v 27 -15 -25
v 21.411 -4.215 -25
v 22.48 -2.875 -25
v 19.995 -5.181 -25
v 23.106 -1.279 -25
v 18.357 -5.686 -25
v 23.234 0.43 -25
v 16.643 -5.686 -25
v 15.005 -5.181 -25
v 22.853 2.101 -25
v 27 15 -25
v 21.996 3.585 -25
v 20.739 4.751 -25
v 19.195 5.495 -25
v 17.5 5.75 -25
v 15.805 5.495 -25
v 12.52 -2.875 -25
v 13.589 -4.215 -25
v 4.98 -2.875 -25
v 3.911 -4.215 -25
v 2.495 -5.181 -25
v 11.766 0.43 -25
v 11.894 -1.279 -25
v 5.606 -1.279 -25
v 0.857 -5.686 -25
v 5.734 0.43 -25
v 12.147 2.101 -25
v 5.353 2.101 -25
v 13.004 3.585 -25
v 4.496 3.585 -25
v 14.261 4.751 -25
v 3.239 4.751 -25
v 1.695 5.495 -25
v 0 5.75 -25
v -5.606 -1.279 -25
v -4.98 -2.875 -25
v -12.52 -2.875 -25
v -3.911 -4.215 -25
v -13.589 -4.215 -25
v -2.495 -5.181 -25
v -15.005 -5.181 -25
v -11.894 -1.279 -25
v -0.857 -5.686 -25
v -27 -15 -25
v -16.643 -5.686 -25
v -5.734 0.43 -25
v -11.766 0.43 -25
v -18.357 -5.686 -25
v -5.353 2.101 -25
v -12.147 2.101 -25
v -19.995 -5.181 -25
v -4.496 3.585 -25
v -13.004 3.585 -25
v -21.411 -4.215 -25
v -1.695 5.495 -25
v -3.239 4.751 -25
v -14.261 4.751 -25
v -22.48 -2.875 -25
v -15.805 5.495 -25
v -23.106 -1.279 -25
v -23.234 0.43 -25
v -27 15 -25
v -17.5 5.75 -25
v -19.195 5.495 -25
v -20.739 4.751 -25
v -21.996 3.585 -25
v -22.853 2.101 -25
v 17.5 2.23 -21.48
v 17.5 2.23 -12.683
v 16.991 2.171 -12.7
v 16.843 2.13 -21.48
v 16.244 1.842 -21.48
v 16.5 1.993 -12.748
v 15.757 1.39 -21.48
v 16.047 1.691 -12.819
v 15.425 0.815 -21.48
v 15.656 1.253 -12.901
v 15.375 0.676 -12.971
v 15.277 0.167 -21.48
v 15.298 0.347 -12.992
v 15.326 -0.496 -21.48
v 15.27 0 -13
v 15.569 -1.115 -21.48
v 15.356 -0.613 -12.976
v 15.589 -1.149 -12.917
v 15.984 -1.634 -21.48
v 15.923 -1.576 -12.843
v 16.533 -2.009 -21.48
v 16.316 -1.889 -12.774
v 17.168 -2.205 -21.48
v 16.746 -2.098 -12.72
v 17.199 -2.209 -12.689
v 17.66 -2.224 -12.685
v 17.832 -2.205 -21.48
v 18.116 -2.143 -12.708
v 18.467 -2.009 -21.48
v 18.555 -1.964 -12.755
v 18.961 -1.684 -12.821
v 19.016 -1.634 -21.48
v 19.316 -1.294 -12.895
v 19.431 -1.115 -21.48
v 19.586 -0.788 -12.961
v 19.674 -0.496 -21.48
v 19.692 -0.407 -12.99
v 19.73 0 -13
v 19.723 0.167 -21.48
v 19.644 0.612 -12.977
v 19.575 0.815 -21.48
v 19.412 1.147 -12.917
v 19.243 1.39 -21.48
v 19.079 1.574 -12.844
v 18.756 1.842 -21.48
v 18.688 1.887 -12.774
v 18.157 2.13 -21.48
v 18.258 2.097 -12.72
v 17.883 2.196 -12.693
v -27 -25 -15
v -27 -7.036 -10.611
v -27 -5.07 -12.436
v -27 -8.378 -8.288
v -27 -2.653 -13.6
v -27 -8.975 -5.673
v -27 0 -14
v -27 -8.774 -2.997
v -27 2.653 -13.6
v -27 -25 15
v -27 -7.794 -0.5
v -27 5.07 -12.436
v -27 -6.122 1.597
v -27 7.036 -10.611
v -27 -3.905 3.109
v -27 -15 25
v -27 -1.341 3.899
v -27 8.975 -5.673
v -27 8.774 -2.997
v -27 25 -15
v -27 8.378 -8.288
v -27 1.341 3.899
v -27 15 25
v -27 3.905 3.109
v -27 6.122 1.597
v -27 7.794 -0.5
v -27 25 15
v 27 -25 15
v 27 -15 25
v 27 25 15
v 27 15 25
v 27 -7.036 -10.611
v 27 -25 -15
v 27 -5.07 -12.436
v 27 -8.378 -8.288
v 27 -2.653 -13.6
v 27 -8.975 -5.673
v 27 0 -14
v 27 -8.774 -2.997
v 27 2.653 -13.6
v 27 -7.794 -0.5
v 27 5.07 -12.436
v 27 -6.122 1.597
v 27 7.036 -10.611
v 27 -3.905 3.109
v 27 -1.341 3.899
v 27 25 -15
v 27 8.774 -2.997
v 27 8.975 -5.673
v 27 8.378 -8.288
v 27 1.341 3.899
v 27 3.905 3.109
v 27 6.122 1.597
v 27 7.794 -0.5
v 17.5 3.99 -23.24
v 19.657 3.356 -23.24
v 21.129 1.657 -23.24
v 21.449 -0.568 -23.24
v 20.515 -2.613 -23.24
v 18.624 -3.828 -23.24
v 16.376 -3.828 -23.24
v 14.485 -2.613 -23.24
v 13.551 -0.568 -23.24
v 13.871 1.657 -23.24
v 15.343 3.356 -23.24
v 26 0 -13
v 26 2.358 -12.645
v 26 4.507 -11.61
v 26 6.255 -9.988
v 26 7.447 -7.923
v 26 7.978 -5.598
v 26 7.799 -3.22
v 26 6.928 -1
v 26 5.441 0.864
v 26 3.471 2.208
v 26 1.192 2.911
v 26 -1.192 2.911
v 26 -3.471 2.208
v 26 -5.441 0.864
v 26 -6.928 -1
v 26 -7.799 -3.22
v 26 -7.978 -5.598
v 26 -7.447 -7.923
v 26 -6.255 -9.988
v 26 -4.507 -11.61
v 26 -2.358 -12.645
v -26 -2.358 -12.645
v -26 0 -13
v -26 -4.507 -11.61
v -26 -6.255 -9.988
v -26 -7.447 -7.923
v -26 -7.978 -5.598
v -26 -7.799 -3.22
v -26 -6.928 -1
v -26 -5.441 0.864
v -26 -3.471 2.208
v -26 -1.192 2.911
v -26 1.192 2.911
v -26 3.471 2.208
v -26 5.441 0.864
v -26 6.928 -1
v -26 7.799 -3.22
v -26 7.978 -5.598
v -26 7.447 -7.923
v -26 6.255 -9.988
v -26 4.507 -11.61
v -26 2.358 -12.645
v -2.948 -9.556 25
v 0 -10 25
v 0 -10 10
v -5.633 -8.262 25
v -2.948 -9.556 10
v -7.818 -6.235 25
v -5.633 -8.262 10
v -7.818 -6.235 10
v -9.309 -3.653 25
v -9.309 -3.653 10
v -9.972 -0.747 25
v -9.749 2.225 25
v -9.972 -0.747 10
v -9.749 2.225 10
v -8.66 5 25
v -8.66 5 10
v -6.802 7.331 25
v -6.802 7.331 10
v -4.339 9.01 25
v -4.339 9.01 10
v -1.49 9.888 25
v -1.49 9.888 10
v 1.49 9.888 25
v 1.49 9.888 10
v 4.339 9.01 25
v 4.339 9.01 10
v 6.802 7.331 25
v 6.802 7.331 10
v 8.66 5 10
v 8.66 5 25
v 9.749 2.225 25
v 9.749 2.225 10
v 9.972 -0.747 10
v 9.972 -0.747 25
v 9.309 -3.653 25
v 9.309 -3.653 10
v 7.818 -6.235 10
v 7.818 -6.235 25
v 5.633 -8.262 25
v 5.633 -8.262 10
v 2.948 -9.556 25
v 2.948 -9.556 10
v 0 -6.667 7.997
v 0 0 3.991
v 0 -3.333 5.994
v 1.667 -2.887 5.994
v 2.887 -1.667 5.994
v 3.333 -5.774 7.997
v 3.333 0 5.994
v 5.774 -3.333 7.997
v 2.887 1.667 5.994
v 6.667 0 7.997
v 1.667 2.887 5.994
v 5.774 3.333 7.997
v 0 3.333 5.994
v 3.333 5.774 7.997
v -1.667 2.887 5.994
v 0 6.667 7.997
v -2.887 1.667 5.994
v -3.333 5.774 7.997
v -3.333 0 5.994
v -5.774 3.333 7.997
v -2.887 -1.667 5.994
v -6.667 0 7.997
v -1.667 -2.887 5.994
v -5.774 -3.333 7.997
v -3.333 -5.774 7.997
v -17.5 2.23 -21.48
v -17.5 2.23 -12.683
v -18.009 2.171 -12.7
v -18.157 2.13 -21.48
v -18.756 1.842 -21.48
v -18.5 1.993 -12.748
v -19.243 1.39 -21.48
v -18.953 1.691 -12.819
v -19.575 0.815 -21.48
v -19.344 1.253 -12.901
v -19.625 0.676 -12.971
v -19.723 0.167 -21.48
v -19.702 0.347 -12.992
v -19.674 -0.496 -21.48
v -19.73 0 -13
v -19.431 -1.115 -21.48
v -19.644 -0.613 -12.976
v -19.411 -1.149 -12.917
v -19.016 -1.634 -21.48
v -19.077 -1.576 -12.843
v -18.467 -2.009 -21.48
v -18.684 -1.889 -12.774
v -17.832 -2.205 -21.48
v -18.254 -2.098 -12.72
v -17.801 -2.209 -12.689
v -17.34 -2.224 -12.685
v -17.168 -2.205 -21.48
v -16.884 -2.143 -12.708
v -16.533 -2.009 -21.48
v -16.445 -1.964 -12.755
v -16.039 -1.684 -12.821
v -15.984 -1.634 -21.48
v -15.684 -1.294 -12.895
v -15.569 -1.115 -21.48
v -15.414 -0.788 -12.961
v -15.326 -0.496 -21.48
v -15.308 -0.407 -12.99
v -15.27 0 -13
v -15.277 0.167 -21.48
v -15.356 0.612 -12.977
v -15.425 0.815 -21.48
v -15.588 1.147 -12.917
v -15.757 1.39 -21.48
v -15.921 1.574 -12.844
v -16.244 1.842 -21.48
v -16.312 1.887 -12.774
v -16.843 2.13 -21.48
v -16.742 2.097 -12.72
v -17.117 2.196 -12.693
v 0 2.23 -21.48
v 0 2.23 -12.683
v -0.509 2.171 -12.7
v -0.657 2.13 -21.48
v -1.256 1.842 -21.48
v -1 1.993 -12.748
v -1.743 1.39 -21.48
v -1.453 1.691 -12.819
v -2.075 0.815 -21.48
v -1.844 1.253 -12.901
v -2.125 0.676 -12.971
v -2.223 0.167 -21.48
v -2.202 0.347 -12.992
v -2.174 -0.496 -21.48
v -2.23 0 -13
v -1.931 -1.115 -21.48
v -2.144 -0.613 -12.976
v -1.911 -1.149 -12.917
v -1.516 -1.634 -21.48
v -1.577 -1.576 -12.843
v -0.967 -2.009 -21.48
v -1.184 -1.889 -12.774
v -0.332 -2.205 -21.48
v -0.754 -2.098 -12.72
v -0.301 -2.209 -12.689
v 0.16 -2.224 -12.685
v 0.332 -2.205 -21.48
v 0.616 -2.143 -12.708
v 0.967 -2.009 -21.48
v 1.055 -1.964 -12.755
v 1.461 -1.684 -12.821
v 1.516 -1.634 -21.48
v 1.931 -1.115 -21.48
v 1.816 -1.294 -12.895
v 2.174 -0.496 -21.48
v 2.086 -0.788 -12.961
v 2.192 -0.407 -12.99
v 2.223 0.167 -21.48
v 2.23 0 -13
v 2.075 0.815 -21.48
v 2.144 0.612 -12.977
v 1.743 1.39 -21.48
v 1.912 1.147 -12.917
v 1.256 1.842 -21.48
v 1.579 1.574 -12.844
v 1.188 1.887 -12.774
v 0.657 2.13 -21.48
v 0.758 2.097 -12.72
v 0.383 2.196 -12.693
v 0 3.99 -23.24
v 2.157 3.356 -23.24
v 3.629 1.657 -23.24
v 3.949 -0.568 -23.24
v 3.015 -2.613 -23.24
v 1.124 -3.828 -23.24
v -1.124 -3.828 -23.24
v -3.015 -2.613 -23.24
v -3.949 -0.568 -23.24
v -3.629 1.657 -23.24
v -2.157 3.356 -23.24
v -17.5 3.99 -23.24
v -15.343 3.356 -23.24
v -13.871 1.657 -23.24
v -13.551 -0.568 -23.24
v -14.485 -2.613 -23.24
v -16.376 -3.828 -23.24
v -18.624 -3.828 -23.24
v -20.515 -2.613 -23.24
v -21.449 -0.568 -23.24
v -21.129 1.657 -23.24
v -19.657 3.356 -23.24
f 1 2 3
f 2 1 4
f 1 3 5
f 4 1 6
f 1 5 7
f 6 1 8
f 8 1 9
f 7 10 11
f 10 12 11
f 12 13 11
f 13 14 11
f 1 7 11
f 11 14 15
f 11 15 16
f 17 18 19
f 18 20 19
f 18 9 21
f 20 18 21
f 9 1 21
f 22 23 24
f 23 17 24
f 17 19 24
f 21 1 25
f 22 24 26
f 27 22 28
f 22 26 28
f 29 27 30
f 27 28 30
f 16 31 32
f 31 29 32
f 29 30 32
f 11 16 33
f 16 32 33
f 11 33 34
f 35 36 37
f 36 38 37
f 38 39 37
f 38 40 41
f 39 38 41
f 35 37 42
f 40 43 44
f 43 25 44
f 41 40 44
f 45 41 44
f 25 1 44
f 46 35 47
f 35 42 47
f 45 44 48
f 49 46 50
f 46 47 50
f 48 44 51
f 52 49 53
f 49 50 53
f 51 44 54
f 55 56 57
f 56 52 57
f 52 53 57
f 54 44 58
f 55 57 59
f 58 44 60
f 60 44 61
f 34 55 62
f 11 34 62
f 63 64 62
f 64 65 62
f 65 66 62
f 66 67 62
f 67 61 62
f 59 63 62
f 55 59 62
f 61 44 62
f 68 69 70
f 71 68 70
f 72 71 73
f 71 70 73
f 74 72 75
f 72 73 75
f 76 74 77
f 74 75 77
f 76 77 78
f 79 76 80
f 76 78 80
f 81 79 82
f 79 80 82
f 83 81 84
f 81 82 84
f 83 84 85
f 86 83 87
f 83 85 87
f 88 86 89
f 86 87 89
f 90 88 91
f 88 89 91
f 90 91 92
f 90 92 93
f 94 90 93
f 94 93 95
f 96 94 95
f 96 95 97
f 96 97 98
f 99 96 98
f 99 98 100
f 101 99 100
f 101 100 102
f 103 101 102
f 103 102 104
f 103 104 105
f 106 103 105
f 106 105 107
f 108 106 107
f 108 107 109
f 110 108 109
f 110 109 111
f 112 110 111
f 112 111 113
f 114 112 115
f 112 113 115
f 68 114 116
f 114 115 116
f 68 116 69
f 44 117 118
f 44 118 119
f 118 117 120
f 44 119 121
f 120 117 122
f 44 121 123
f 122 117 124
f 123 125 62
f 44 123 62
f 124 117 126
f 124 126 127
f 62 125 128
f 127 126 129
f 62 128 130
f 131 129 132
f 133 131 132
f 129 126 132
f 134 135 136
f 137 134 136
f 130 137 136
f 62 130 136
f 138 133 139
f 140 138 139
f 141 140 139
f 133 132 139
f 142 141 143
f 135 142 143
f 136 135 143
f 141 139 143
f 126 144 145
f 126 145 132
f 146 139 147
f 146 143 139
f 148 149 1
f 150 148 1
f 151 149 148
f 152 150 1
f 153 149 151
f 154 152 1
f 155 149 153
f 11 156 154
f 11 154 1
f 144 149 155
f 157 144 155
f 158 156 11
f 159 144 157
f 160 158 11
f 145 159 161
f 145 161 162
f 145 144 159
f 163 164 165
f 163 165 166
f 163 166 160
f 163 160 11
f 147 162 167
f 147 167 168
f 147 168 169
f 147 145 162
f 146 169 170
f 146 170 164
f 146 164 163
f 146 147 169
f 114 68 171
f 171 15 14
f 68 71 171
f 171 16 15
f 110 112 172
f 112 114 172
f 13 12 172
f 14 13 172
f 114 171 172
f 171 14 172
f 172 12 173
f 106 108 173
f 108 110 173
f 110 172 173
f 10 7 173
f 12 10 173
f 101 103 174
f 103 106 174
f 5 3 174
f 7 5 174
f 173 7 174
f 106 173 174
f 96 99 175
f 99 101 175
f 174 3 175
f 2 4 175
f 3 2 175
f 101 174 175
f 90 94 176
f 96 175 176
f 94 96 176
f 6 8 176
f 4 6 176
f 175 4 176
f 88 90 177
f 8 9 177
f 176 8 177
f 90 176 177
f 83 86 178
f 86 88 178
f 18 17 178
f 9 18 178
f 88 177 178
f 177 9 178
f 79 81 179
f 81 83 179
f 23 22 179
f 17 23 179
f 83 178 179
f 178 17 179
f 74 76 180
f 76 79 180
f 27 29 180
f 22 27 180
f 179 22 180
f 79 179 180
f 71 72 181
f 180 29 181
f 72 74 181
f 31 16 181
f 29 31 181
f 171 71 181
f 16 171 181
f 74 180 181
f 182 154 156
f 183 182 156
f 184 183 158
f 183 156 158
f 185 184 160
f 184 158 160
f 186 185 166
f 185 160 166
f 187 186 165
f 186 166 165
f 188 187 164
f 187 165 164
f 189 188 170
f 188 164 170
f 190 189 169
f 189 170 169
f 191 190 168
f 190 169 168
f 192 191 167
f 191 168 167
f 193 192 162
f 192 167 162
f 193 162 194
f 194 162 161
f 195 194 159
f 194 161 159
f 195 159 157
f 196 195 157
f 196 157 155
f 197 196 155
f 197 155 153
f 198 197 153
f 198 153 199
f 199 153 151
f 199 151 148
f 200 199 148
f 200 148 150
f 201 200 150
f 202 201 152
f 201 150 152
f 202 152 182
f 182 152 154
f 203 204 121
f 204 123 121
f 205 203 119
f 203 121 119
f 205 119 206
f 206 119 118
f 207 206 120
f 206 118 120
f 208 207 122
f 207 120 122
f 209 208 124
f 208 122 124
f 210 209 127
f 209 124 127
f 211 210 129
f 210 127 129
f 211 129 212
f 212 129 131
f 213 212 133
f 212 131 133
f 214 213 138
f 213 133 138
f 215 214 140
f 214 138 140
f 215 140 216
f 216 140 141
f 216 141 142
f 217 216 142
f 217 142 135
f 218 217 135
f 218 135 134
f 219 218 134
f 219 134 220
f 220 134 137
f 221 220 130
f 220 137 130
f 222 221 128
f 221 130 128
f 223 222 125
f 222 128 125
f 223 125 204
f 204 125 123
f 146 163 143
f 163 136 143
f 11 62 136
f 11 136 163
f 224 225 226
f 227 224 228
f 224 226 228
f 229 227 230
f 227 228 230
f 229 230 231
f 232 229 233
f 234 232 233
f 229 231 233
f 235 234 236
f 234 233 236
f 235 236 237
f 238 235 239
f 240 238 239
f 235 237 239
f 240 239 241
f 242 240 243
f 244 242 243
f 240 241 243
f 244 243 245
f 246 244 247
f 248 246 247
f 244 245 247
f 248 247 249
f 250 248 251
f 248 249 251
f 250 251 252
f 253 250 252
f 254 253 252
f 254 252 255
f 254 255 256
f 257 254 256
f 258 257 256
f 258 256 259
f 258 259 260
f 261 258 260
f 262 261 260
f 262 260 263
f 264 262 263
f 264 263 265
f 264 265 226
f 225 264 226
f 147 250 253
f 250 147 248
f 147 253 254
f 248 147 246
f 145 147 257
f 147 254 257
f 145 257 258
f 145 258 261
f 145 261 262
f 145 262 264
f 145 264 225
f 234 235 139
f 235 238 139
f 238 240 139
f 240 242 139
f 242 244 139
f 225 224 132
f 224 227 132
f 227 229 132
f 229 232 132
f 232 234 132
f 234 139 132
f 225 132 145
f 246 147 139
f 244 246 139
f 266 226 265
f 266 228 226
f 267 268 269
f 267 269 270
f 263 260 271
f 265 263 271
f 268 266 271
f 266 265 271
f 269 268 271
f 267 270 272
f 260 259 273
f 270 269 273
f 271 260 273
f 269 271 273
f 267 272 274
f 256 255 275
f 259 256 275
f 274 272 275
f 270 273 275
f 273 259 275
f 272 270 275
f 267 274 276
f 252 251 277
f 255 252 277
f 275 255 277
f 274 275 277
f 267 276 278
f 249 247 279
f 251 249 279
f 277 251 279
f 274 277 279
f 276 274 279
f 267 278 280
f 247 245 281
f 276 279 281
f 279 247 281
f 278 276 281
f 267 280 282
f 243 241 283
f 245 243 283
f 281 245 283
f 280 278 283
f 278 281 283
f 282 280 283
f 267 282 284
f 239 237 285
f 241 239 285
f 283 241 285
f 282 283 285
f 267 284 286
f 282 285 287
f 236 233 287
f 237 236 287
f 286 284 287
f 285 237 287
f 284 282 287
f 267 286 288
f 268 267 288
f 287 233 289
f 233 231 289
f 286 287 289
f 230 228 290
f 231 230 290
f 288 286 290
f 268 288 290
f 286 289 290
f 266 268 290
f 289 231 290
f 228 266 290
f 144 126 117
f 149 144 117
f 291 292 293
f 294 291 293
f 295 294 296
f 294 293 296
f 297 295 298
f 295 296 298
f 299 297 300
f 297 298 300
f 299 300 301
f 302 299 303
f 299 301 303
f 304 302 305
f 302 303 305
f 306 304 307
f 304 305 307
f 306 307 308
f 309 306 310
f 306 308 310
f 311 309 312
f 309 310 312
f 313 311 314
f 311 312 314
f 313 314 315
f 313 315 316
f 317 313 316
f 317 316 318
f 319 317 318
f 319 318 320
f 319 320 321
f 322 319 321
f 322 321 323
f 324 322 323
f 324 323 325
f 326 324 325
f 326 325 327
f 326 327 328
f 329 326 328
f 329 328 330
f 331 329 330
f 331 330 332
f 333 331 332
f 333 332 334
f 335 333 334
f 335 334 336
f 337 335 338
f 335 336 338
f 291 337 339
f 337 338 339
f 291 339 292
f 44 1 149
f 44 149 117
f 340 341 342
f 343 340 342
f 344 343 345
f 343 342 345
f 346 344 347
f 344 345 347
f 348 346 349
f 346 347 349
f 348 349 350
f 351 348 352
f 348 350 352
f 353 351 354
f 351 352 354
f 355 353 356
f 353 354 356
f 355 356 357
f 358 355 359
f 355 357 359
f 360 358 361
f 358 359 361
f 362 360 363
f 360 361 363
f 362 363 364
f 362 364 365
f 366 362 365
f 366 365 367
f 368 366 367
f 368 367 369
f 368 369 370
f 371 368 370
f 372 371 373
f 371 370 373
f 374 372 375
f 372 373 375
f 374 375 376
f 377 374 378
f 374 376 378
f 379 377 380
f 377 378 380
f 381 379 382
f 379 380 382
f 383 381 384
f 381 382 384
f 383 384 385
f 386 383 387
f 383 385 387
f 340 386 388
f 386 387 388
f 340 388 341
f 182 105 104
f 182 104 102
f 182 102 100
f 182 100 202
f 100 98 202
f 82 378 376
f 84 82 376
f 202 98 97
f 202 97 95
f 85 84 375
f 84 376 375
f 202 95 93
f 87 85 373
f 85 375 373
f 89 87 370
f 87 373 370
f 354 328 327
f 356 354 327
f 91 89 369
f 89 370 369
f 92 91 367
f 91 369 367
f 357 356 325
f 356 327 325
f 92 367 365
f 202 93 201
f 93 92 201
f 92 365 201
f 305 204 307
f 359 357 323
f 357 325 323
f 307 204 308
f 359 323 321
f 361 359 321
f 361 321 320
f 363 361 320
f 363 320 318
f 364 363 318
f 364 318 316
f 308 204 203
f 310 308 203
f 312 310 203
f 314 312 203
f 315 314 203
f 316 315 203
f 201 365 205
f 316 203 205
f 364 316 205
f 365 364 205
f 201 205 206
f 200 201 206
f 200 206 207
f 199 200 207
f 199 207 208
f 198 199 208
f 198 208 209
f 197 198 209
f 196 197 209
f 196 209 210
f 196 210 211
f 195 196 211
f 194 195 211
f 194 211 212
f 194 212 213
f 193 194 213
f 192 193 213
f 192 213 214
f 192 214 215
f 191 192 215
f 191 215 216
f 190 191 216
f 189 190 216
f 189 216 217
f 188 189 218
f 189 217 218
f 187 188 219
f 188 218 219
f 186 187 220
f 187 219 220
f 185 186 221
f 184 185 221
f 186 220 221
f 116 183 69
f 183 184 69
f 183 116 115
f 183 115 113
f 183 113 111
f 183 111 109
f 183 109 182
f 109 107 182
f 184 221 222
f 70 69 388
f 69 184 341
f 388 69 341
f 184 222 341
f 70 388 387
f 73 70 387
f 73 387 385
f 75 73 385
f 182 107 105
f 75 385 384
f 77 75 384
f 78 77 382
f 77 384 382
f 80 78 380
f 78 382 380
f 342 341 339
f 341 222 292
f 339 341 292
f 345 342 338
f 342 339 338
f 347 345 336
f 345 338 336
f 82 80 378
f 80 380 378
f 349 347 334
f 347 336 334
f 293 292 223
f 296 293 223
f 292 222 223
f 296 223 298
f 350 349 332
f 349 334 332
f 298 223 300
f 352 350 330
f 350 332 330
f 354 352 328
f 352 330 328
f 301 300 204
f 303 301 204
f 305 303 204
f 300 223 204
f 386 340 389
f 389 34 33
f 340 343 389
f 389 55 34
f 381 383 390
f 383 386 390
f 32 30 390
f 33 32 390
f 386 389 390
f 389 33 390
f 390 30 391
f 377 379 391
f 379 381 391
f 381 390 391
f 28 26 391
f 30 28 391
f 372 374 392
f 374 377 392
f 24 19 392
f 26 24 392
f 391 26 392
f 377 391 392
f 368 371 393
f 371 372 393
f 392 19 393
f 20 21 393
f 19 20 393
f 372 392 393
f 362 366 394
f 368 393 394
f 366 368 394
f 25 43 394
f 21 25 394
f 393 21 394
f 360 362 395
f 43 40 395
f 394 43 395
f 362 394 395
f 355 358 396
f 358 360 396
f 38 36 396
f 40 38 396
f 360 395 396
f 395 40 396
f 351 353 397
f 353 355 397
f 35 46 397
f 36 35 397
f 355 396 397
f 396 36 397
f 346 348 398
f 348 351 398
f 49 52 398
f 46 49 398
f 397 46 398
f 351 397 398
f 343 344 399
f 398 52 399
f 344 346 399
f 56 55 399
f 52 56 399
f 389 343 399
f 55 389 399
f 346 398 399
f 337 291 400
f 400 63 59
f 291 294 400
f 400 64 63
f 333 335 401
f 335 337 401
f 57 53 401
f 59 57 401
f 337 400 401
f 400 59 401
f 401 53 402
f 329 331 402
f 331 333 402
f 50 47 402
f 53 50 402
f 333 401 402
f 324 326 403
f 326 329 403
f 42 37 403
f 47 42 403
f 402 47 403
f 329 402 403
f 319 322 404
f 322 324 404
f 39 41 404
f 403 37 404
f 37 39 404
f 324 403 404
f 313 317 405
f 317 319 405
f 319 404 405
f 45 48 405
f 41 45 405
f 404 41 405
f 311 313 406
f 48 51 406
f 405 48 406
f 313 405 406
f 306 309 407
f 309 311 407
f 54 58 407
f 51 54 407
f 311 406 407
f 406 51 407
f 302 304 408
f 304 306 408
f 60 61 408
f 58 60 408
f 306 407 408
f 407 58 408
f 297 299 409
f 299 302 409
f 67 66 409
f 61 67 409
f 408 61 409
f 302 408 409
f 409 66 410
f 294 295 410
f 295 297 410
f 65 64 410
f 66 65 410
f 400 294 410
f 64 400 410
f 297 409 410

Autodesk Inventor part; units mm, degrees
ref_plane "YZ Plane" through (0, 0, 0) normal (1, 0, 0) x (0, 1, 0)
ref_plane "XZ Plane" through (0, 0, 0) normal (0, 1, 0) x (-1, 0, 0)
ref_plane "XY Plane" through (0, 0, 0) normal (0, 0, 1) x (1, 0, 0)
sketch "Sketch1" plane through (0, 0, 0) normal (1, 0, 0) x (0, 1, 0)
  line L0 (0, 35) -> (0, -35) projected
  line L1 (-35, 0) -> (35, 0) projected
  line L2 (-25, -25) -> (25, -25)
  line L3 (25, -25) -> (25, 25)
  line L4 (25, 25) -> (-25, 25)
  line L5 (-25, 25) -> (-25, -25)
  line L6 (-25, -25) -> (25, 25) construction
  line L7 (25, -25) -> (-25, 25) construction
  point P0 (0, 0)
  dimension "d1" = 50
  dimension "d2" = 50
extrude "Base" add sketch "Sketch1" along normal mid plane 54
sketch "Sketch2" plane through (27, 0, 0) normal (1, 0, 0) x (0, 0, -1)
  line L0 (-35, 0) -> (35, 0) construction
  line L1 (25, -25) -> (25, 25) construction
  point P0 (0, 0)
  point P1 (5, 0)
  dimension "d5" = 20
hole "Hole_Wheel" at (27, 0, -5) direction (-1, 0, 0) diameter 16 end through all
sketch "Sketch3" plane through (27, 25, -25) normal (0, 0, -1) x (-1, 0, 0)
  line L0 (54, -33) -> (0, -33) construction
  line L1 (54, -17) -> (0, -17) construction
  line L2 (54, 0) -> (0, 0) construction
  line L3 (0, -50) -> (0, 0) construction
  line L4 (0, -50) -> (54, -50) construction
  line L5 (54, 0) -> (54, -50) construction
  line L6 (54, -50) -> (54, 0) projected
  line L7 (54, -25) -> (0, -25) construction
  line L8 (54, -50) -> (0, -50) projected
  line L9 (27, -50) -> (27, 0) construction
  line L10 (54, 0) -> (0, 0) projected
  point P0 (27, -25)
  point P1 (44.5, -25)
  point P2 (9.5, -25)
  point P3 (27, -25)
  dimension "d13" = 35
hole "Hole_Wheel_Fix" at (-17.5, 0, -25) at (17.5, 0, -25) at (0, 0, -25) direction (0, 0, 1) diameter 4.459 end up to surface countersink diameter 11.5 countersink angle 90 thread size "M5x0.5" class "6H" standard "ISO Metric profile"
sketch "Sketch4" plane through (-27, -25, 25) normal (0, 0, 1) x (1, 0, 0)
  line L0 (54, 50) -> (54, 0) construction
  line L1 (0, 0) -> (0, 50) construction
  line L2 (0, 50) -> (54, 50) construction
  line L3 (0, 0) -> (54, 0) construction
  line L4 (54, 0) -> (54, 50) construction
  line L5 (52, 52) -> (0, 0) construction
  line L6 (54, 0) -> (0, 0) construction
  line L7 (52, -2) -> (0, 50) construction
  point P0 (27, 25)
  point P1 (27, 25)
hole "ConnectionPipe" at (0, 0, 25) direction (0, 0, -1) diameter 20 depth 15 tip angle 118
chamfer "Chamfer1" distance 10 angle 45 4 edges at (0, 25, -25) (0, -25, -25) (0, 25, 25) (0, -25, 25)
chamfer "Chamfer2" distance 1 angle 45 2 edges at (-27, 0, 3) (27, 0, 3)
properties part number "10-004-ACTR-FIX" material "Stainless Steel"
